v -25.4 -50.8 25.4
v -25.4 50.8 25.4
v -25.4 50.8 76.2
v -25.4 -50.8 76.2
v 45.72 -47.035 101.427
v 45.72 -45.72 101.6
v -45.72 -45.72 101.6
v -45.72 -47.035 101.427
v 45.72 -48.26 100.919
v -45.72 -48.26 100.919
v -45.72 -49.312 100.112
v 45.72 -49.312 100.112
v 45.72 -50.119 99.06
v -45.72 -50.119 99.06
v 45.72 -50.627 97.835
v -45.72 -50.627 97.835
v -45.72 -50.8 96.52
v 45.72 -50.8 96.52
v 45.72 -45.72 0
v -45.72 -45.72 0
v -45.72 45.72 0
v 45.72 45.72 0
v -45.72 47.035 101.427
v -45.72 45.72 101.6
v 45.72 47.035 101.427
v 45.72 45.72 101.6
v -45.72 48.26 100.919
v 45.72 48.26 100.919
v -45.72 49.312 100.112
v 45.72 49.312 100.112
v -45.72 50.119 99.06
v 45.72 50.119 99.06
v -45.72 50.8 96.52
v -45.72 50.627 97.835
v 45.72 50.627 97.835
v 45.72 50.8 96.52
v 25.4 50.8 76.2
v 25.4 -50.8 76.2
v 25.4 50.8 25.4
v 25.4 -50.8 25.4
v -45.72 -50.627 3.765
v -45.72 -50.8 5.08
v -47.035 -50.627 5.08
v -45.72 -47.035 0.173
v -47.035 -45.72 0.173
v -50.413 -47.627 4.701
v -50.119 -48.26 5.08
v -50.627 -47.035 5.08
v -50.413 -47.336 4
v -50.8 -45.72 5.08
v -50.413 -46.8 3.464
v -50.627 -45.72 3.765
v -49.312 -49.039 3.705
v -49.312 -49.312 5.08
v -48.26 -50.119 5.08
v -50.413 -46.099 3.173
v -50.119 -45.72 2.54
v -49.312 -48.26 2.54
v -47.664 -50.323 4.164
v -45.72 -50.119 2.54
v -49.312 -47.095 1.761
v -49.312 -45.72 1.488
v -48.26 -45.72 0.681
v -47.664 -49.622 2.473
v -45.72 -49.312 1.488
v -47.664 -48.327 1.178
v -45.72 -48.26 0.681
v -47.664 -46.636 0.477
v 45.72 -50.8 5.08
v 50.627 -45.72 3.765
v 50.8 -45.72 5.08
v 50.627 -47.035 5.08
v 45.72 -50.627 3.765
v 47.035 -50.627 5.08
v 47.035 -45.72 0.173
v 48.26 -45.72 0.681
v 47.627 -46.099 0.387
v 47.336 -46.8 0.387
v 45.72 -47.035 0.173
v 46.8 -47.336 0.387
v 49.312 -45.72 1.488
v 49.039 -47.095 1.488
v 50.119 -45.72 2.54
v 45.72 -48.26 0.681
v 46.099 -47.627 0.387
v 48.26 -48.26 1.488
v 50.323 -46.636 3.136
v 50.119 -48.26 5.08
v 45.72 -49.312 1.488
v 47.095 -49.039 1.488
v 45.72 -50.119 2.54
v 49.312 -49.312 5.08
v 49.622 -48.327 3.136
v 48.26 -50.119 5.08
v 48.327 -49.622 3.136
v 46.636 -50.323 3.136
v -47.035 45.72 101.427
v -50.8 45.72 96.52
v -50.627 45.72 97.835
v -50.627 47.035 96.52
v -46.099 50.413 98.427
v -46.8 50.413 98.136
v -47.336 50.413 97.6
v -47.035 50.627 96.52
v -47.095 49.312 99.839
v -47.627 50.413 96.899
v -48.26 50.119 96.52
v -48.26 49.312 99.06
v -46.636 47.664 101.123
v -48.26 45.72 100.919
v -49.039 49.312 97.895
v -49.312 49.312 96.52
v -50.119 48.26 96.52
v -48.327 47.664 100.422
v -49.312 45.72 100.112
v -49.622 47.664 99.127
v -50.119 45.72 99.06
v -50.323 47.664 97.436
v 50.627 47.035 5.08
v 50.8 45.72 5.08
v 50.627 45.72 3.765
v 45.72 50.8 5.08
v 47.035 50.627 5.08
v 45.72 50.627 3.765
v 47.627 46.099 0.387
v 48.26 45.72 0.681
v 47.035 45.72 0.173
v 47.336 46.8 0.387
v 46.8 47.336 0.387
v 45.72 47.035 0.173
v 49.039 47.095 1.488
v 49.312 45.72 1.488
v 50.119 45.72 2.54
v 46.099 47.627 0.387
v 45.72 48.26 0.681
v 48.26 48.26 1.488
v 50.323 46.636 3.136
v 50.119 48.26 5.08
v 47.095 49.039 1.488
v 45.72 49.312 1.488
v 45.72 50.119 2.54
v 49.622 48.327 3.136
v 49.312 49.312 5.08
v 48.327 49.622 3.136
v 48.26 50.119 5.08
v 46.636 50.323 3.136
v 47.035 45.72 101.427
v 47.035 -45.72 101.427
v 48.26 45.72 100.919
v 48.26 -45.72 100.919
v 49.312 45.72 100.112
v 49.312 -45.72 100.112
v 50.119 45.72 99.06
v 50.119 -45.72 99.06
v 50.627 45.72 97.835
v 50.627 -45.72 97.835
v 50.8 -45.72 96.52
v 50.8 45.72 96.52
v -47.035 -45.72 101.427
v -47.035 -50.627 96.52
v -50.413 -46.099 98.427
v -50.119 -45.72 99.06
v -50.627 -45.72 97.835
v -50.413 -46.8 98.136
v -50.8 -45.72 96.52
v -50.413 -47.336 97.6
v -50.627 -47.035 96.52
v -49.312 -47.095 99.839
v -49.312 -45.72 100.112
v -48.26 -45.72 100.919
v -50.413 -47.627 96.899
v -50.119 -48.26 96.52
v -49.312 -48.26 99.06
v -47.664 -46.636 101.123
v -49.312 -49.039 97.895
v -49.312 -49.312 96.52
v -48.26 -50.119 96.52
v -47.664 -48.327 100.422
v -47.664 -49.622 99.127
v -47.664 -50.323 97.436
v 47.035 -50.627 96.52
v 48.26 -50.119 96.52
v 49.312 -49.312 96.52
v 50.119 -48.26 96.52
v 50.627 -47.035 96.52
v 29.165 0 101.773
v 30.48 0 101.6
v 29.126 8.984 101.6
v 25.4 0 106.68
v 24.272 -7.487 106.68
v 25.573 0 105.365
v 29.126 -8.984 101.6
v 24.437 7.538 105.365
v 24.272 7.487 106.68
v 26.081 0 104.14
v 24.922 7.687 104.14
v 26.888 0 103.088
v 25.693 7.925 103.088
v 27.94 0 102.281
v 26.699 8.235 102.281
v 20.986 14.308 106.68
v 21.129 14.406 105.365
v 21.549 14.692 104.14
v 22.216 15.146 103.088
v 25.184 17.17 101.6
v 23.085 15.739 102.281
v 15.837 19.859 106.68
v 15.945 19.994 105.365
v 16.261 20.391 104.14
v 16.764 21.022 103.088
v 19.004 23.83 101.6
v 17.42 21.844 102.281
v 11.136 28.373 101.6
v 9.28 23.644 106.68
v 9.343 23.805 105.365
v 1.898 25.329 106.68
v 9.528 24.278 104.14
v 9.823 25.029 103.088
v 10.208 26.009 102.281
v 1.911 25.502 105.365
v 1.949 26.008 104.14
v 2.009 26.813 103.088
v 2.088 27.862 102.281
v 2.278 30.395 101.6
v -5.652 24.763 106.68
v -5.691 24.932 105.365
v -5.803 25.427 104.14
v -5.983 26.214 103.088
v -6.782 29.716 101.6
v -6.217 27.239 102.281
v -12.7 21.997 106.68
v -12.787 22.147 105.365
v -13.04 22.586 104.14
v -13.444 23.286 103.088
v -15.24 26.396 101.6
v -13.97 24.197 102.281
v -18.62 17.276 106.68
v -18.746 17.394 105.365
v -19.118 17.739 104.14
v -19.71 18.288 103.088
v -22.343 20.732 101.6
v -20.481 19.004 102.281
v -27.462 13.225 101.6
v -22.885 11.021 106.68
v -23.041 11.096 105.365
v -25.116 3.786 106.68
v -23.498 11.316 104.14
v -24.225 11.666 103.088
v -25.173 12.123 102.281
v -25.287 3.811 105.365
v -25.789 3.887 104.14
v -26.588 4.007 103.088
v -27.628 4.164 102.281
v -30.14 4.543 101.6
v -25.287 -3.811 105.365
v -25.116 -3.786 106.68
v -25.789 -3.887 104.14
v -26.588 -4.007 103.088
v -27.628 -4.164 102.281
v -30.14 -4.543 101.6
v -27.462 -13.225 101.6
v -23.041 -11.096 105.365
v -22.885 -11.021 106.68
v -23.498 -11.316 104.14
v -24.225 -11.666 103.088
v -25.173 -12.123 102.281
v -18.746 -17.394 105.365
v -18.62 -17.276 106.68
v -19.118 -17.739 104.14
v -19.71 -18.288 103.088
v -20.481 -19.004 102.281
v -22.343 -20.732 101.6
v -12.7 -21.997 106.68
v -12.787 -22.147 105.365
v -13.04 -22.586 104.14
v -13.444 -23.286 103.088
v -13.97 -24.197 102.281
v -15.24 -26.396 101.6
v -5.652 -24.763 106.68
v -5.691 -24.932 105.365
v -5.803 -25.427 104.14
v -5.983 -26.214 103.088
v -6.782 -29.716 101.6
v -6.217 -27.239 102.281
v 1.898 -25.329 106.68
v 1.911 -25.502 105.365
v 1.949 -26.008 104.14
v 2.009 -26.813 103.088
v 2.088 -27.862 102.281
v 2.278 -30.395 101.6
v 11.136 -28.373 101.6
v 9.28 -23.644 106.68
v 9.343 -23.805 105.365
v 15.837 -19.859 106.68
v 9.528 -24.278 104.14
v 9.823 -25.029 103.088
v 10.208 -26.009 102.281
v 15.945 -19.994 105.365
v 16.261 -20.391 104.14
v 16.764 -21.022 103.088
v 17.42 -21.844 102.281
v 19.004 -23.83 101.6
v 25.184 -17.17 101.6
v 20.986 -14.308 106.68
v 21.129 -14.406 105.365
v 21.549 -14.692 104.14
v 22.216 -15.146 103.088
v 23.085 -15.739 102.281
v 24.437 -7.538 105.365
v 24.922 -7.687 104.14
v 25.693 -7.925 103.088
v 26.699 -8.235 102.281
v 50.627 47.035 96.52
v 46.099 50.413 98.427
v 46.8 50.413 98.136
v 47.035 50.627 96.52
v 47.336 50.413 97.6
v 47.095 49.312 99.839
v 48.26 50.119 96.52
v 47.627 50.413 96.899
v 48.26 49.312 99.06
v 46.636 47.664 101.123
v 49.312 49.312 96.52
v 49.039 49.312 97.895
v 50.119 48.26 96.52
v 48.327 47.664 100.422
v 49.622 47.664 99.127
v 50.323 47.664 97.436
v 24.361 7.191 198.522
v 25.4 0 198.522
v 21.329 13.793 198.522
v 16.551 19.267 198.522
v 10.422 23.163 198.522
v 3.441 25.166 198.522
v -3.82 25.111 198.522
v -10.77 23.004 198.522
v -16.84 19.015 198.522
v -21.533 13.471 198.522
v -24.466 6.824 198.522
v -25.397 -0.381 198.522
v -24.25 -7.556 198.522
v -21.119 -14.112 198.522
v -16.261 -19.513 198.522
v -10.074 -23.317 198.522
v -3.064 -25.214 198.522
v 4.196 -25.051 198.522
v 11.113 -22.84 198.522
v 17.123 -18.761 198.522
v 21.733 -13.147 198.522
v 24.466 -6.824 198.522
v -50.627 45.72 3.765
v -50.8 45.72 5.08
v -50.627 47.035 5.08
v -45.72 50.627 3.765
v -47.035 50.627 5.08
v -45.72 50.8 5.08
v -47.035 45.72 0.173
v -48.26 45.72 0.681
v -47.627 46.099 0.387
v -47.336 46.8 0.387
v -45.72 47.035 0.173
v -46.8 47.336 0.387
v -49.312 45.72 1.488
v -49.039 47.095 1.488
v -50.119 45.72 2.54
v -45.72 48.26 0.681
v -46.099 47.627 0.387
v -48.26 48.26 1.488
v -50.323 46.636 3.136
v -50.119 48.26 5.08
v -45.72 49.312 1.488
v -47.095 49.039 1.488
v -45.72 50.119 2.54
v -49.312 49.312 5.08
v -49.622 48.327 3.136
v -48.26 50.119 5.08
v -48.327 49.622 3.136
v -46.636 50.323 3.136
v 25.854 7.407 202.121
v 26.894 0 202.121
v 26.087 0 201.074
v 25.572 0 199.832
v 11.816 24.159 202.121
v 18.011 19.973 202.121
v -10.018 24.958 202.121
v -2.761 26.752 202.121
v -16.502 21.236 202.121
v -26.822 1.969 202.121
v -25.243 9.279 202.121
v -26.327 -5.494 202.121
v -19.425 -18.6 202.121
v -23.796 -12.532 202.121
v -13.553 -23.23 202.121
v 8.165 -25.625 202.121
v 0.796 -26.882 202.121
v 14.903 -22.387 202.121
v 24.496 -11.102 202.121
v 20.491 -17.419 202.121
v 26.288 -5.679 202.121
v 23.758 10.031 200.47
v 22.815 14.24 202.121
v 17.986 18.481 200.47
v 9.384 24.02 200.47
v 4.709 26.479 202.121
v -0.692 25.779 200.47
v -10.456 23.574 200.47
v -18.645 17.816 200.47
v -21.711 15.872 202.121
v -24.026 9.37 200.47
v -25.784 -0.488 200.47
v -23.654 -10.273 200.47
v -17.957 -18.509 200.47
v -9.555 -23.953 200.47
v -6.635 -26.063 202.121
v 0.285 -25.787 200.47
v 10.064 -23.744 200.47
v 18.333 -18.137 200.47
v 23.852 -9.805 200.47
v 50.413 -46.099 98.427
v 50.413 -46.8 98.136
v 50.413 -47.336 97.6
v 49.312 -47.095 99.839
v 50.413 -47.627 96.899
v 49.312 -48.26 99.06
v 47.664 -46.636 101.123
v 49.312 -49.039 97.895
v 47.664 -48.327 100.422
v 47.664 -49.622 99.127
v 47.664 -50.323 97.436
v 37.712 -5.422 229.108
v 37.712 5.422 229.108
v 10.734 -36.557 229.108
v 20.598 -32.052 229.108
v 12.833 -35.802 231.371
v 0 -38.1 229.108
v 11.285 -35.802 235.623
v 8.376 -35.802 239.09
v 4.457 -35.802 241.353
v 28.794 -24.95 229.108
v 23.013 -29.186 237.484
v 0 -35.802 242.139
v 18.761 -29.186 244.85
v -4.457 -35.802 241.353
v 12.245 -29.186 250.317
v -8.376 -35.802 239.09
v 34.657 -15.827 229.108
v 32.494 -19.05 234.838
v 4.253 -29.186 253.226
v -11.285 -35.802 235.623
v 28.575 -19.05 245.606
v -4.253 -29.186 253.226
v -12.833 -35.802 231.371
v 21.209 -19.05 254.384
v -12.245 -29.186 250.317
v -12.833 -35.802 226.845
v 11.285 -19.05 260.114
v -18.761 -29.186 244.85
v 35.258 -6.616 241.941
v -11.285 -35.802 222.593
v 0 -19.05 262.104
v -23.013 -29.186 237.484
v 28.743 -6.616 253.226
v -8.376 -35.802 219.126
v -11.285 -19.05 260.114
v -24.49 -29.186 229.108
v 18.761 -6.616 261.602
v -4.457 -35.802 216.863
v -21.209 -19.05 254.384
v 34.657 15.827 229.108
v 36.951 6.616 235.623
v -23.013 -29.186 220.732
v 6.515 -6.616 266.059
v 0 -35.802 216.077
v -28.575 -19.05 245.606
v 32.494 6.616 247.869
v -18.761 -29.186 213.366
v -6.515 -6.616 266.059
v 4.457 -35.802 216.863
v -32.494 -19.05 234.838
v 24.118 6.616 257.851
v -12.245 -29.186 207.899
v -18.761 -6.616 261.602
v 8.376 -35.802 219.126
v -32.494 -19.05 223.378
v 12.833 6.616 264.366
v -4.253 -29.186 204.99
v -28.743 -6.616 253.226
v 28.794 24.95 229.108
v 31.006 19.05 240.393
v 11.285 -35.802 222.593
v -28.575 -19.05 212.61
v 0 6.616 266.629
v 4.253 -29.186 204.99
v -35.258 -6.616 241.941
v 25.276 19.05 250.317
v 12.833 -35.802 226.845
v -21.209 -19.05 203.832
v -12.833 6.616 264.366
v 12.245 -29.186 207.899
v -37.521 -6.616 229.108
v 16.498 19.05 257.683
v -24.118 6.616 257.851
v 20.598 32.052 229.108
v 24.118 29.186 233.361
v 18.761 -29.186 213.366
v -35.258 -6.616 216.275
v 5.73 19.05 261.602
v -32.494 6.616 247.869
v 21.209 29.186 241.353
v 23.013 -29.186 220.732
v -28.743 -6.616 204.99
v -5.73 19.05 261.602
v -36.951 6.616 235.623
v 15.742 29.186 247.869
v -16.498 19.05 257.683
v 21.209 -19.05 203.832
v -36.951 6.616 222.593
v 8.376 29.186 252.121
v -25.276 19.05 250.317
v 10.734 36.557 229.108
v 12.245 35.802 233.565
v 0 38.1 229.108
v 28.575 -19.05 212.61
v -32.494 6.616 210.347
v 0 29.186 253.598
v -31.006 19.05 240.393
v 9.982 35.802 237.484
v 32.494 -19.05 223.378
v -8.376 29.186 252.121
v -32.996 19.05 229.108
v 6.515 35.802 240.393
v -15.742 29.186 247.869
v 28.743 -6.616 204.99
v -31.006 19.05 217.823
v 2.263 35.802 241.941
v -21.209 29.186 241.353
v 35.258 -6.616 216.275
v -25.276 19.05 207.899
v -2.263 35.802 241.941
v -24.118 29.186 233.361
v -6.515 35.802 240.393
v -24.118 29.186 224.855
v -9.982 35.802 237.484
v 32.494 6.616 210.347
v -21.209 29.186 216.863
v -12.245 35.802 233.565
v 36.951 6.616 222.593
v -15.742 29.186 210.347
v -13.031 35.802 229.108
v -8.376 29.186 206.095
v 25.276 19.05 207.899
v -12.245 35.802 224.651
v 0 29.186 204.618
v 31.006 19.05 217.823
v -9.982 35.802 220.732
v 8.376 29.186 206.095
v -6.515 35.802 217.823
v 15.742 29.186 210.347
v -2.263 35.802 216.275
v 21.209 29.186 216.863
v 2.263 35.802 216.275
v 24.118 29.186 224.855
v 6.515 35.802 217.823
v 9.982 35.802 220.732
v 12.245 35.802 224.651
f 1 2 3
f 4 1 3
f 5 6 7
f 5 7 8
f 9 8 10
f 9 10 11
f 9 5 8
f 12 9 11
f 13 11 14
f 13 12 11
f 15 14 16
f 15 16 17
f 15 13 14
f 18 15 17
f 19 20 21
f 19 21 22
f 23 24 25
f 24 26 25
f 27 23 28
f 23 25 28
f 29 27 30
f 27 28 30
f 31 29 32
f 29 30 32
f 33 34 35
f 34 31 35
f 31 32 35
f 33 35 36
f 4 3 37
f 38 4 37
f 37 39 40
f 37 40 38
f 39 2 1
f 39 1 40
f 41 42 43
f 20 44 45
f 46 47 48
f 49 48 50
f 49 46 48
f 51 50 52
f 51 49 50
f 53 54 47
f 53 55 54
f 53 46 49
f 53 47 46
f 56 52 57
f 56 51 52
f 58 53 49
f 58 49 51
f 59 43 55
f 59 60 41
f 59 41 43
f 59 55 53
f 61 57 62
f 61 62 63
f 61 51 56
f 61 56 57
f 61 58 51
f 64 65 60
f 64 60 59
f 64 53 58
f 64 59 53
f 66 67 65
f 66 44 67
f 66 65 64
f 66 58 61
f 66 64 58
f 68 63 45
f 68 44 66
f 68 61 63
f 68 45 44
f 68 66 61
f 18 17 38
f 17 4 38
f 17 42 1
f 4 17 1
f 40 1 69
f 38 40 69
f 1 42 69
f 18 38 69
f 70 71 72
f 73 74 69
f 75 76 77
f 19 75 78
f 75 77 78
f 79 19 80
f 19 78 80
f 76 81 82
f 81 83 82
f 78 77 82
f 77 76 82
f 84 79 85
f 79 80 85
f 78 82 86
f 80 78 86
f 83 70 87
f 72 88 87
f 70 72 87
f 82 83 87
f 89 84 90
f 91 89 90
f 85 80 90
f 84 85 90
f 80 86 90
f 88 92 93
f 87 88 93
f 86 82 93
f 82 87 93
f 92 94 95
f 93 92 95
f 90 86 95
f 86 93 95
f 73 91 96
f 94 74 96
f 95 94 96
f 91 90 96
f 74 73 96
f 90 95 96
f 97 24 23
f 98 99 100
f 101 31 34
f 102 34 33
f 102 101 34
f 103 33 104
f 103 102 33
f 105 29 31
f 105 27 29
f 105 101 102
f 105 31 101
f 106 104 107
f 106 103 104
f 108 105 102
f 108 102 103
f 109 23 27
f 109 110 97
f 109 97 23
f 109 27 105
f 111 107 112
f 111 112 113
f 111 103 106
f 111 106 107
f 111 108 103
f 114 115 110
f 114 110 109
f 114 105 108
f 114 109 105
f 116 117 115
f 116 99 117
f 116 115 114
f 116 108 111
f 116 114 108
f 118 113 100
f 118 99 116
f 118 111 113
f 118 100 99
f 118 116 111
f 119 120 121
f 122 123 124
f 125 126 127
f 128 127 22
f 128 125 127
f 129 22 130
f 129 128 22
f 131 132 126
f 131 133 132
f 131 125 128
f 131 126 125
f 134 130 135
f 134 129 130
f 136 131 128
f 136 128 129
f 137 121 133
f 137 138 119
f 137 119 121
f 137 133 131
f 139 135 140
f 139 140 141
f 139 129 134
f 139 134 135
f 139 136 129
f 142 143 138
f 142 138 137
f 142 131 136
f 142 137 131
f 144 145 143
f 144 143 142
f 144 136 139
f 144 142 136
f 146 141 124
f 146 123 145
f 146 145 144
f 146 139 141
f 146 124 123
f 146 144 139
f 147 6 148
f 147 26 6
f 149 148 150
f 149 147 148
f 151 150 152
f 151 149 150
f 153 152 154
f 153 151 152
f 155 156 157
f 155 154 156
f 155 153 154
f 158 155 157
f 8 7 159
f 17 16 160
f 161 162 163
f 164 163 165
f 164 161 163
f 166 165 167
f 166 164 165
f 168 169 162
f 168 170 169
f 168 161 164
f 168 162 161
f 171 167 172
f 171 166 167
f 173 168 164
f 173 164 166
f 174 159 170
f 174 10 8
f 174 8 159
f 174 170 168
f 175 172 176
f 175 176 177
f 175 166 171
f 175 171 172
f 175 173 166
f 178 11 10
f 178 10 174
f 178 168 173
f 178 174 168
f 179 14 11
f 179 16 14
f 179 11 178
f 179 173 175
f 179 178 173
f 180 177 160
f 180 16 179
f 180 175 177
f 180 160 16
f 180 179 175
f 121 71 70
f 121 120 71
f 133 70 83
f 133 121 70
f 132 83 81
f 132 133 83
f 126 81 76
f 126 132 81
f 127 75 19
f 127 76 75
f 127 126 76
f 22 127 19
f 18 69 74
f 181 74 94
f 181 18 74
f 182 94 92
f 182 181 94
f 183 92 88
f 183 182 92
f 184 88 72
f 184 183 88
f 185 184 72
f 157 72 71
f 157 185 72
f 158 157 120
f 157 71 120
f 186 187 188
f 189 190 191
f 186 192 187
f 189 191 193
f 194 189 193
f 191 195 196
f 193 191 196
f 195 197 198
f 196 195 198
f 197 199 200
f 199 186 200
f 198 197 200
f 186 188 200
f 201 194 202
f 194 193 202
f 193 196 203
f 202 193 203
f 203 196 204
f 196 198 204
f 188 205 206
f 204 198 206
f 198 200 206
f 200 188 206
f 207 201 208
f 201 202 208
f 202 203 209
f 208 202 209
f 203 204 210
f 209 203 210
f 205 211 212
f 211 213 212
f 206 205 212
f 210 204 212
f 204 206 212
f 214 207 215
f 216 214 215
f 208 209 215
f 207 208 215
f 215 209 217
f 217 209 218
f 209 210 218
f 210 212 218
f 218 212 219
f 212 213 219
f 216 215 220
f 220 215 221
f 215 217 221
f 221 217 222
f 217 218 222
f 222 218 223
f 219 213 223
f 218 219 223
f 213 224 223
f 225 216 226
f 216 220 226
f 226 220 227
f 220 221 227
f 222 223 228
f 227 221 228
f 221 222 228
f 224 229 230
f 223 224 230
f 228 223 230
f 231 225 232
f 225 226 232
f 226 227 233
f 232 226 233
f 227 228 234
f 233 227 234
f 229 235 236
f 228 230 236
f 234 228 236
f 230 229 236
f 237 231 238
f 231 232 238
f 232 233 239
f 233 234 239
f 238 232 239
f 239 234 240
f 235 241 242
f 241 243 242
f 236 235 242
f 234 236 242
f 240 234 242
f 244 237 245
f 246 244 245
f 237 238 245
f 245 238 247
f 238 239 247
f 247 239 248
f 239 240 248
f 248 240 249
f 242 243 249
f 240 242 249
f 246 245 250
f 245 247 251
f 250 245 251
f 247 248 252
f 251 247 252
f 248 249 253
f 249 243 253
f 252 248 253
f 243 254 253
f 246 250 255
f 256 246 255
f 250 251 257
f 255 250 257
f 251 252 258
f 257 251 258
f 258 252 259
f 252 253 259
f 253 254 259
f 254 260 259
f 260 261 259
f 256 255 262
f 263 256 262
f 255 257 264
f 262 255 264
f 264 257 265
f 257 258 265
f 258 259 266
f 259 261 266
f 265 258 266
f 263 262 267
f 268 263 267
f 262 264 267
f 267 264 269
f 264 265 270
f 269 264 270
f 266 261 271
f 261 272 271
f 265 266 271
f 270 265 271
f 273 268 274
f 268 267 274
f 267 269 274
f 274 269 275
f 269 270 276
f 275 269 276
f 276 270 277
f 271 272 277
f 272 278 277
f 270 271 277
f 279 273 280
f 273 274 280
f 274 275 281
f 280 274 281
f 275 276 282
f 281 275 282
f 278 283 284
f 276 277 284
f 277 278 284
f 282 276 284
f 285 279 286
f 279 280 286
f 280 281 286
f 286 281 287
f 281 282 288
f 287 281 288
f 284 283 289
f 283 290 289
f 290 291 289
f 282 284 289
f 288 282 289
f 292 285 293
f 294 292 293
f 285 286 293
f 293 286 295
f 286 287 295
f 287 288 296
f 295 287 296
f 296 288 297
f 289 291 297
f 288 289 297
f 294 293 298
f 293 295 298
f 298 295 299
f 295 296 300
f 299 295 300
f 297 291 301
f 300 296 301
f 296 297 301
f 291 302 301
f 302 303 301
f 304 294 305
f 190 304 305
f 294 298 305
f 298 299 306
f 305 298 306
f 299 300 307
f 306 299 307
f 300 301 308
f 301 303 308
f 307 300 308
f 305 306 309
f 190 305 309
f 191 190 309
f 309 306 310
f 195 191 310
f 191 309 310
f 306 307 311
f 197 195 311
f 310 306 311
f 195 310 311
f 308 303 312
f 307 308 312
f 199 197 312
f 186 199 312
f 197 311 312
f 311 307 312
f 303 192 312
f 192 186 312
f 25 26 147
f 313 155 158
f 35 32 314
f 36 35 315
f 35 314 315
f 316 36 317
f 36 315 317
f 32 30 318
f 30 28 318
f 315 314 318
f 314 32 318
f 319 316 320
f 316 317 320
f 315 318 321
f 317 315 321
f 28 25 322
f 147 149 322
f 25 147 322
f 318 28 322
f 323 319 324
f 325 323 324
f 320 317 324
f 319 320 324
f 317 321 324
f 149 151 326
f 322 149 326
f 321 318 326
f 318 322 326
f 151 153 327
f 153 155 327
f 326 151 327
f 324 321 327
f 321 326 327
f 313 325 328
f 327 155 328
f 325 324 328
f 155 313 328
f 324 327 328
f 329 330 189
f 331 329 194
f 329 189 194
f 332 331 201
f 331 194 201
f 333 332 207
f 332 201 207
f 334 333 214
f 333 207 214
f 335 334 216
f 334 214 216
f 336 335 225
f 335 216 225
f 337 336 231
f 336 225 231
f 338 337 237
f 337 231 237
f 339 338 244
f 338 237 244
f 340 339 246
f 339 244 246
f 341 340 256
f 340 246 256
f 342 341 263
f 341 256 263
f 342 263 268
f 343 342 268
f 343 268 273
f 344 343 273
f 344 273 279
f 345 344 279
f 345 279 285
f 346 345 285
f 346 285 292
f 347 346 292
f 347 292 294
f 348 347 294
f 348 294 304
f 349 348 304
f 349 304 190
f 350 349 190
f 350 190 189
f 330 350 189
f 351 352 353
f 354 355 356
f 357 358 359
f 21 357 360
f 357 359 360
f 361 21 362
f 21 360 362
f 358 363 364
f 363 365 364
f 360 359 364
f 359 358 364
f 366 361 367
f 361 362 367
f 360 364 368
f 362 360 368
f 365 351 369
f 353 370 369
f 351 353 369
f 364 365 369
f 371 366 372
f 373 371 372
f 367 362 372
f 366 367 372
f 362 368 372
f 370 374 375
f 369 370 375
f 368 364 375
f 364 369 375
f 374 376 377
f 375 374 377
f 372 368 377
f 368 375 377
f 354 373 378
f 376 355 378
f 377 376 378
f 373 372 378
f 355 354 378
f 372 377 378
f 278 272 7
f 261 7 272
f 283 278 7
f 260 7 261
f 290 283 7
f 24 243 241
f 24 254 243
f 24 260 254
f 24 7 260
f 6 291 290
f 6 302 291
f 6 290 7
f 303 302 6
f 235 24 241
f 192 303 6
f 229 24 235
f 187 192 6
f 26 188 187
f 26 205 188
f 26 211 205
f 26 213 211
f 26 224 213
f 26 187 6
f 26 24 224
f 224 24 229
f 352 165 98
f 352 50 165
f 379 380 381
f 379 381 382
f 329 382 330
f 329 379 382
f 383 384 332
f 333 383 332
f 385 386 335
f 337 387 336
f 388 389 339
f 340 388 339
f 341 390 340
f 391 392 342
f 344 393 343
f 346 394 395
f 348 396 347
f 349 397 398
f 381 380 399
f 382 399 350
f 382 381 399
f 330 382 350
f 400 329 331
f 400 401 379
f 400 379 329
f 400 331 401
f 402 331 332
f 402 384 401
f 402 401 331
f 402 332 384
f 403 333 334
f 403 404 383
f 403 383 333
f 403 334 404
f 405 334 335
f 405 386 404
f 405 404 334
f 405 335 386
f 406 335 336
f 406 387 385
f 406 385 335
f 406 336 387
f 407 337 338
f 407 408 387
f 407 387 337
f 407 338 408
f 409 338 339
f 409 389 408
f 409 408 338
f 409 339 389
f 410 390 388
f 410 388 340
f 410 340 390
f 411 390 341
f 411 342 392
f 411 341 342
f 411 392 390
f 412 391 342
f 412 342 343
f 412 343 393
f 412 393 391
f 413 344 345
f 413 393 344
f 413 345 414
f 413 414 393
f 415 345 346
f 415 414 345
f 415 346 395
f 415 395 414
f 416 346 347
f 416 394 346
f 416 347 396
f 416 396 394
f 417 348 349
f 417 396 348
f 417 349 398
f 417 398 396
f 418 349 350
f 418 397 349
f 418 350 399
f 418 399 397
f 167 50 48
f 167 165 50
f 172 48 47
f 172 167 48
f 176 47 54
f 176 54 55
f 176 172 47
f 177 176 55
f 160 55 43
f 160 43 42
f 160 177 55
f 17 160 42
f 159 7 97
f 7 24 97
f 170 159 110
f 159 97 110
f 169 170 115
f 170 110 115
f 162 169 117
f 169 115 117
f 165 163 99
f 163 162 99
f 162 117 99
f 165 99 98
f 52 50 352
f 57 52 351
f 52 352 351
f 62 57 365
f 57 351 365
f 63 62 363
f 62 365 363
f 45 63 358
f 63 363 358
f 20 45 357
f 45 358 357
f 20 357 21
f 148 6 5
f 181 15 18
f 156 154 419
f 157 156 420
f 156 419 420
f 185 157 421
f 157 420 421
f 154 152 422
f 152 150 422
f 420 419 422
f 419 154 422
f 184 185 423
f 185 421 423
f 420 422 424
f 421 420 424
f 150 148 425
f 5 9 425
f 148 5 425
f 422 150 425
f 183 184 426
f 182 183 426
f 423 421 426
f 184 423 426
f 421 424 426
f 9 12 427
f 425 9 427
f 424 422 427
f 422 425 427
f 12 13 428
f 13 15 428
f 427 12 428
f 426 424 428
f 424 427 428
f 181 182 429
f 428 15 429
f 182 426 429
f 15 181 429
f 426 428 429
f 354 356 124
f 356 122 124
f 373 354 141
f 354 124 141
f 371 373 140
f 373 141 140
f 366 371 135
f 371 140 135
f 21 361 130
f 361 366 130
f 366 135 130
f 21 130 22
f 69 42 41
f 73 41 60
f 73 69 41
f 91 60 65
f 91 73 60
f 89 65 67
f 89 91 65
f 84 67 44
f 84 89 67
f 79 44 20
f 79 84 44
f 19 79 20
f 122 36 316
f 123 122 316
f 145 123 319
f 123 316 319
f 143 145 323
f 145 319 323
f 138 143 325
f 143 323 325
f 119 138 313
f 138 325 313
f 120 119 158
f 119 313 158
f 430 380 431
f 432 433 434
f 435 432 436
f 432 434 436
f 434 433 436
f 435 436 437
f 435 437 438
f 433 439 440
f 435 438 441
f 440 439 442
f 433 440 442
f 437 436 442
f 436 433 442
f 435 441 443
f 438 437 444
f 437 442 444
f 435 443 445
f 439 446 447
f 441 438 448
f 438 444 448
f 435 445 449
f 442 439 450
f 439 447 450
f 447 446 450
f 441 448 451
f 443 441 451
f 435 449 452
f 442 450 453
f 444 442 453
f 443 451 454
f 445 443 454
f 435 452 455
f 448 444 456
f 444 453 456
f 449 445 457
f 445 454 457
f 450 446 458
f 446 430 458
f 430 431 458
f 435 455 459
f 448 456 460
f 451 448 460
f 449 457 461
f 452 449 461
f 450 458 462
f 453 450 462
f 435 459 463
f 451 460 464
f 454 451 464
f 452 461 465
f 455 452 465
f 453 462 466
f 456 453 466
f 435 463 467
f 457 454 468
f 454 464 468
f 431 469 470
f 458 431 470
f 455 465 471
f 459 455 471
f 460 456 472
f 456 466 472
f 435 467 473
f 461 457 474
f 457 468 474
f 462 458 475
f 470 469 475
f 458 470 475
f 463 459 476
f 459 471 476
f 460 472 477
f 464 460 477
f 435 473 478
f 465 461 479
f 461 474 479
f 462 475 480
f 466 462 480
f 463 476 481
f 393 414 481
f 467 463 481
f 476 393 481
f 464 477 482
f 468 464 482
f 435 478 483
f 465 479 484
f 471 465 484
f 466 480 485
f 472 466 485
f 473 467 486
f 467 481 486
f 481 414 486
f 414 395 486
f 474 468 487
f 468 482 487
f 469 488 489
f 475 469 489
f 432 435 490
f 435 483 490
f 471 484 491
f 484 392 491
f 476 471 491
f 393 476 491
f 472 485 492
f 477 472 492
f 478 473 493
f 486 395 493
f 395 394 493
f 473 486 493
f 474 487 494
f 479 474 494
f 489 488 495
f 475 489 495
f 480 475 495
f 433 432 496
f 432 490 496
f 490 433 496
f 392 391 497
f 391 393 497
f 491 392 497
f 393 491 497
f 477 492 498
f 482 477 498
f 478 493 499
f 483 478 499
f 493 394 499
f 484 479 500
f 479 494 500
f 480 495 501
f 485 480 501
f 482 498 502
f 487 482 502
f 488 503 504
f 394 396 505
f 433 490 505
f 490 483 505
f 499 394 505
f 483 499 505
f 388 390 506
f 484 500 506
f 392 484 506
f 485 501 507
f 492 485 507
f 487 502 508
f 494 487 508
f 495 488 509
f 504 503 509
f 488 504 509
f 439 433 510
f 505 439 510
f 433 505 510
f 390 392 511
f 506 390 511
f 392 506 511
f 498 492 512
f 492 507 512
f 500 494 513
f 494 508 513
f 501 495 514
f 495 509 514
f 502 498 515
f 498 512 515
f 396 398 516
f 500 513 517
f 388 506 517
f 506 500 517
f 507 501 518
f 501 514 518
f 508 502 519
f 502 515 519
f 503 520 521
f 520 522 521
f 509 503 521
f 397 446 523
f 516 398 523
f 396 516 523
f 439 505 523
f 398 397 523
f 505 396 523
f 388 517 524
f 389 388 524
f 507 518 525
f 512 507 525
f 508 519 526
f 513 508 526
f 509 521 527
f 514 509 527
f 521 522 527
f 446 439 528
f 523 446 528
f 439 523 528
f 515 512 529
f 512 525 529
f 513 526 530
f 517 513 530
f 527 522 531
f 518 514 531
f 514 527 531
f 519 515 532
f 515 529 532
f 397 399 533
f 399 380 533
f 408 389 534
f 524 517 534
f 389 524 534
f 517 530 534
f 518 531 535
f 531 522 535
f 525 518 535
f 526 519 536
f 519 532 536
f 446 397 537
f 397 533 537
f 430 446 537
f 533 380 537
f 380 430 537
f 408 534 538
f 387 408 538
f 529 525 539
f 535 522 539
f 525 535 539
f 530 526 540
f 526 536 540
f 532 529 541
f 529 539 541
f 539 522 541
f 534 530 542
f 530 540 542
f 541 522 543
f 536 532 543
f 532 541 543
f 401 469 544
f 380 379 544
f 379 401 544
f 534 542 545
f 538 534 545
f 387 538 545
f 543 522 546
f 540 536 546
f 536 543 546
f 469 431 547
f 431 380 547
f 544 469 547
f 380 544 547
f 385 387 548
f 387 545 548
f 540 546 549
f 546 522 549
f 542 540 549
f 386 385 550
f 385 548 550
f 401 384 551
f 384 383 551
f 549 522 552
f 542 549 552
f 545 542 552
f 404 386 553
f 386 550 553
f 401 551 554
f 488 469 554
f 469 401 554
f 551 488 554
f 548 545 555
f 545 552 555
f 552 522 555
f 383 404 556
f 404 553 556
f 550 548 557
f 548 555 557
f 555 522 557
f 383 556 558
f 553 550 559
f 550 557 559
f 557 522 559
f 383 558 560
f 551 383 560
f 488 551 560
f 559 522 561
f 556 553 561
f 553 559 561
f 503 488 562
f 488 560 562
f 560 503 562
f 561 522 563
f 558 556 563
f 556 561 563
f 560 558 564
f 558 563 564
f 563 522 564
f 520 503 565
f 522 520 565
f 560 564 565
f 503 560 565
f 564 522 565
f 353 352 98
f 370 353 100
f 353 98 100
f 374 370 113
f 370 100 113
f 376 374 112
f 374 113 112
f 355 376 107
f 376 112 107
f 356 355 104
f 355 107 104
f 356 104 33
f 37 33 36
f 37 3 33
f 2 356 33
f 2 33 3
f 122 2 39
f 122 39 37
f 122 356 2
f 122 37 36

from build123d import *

# Parameters (mm, degrees)
F0_W     = 101.6
F0_H     = 101.6
F1_DEPTH = 101.6
F2_R     = 25.4
F3_DEPTH = 127.508
F6_W     = 50.8
F6_H     = 50.8
F7_DEPTH = 101.6
F8_R     = 5.08


with BuildPart() as f1:
    # F0 (on Top) → F1 (new body)
    with BuildSketch(Plane.XY):
        Rectangle(F0_W, F0_H)
    extrude(amount=F1_DEPTH)

    # F2 (on face) → F3 (join)
    with BuildSketch(Plane.XY.offset(101.6)):
        Circle(F2_R)
    extrude(amount=F3_DEPTH)

    # F4 (on face) → F5 (revolve)
    with BuildSketch(Plane.XY.offset(229.108)):
        with BuildLine():
            Line((0, -25.4), (0, -38.1))
            ThreePointArc((0, -38.1), (38.1, 0), (0, 38.1))
            Line((0, 38.1), (0, 25.4))
            ThreePointArc((0, 25.4), (17.9605122421, 17.9605122421), (25.4, 0))
            ThreePointArc((25.4, 0), (17.9605122421, -17.9605122421), (0, -25.4))
        make_face()
        with BuildLine():
            ThreePointArc((0, 25.4), (-25.4, 0), (0, -25.4))
            Line((0, -25.4), (0, 25.4))
        make_face()
    revolve(axis=Axis((0, 0, 229.108), (0, -1, 0)))

    # F6 (on face) → F7 (cut)
    with BuildSketch(Plane.XZ.offset(50.8)):
        with Locations((0, 50.8)):
            Rectangle(F6_W, F6_H)
    extrude(amount=-F7_DEPTH, mode=Mode.SUBTRACT)

    # F8
    f8_edges = [f1.edges().sort_by_distance(p)[0] for p in [
        (0, -50.8, 101.6),
        (-50.8, 0, 101.6),
        (50.8, 0, 101.6),
        (0, 50.8, 101.6),
        (50.8, -50.8, 50.8),
        (50.8, 50.8, 50.8),
        (50.8, 0, 0),
        (0, -50.8, 0),
        (-50.8, -50.8, 50.8),
        (-50.8, 50.8, 50.8),
        (-50.8, 0, 0),
        (0, 50.8, 0),
        (-25.4, 0, 200.709937),
        (-25.4, 0, 101.6),
    ]]
    fillet(f8_edges, radius=F8_R)


solid = f1.part
